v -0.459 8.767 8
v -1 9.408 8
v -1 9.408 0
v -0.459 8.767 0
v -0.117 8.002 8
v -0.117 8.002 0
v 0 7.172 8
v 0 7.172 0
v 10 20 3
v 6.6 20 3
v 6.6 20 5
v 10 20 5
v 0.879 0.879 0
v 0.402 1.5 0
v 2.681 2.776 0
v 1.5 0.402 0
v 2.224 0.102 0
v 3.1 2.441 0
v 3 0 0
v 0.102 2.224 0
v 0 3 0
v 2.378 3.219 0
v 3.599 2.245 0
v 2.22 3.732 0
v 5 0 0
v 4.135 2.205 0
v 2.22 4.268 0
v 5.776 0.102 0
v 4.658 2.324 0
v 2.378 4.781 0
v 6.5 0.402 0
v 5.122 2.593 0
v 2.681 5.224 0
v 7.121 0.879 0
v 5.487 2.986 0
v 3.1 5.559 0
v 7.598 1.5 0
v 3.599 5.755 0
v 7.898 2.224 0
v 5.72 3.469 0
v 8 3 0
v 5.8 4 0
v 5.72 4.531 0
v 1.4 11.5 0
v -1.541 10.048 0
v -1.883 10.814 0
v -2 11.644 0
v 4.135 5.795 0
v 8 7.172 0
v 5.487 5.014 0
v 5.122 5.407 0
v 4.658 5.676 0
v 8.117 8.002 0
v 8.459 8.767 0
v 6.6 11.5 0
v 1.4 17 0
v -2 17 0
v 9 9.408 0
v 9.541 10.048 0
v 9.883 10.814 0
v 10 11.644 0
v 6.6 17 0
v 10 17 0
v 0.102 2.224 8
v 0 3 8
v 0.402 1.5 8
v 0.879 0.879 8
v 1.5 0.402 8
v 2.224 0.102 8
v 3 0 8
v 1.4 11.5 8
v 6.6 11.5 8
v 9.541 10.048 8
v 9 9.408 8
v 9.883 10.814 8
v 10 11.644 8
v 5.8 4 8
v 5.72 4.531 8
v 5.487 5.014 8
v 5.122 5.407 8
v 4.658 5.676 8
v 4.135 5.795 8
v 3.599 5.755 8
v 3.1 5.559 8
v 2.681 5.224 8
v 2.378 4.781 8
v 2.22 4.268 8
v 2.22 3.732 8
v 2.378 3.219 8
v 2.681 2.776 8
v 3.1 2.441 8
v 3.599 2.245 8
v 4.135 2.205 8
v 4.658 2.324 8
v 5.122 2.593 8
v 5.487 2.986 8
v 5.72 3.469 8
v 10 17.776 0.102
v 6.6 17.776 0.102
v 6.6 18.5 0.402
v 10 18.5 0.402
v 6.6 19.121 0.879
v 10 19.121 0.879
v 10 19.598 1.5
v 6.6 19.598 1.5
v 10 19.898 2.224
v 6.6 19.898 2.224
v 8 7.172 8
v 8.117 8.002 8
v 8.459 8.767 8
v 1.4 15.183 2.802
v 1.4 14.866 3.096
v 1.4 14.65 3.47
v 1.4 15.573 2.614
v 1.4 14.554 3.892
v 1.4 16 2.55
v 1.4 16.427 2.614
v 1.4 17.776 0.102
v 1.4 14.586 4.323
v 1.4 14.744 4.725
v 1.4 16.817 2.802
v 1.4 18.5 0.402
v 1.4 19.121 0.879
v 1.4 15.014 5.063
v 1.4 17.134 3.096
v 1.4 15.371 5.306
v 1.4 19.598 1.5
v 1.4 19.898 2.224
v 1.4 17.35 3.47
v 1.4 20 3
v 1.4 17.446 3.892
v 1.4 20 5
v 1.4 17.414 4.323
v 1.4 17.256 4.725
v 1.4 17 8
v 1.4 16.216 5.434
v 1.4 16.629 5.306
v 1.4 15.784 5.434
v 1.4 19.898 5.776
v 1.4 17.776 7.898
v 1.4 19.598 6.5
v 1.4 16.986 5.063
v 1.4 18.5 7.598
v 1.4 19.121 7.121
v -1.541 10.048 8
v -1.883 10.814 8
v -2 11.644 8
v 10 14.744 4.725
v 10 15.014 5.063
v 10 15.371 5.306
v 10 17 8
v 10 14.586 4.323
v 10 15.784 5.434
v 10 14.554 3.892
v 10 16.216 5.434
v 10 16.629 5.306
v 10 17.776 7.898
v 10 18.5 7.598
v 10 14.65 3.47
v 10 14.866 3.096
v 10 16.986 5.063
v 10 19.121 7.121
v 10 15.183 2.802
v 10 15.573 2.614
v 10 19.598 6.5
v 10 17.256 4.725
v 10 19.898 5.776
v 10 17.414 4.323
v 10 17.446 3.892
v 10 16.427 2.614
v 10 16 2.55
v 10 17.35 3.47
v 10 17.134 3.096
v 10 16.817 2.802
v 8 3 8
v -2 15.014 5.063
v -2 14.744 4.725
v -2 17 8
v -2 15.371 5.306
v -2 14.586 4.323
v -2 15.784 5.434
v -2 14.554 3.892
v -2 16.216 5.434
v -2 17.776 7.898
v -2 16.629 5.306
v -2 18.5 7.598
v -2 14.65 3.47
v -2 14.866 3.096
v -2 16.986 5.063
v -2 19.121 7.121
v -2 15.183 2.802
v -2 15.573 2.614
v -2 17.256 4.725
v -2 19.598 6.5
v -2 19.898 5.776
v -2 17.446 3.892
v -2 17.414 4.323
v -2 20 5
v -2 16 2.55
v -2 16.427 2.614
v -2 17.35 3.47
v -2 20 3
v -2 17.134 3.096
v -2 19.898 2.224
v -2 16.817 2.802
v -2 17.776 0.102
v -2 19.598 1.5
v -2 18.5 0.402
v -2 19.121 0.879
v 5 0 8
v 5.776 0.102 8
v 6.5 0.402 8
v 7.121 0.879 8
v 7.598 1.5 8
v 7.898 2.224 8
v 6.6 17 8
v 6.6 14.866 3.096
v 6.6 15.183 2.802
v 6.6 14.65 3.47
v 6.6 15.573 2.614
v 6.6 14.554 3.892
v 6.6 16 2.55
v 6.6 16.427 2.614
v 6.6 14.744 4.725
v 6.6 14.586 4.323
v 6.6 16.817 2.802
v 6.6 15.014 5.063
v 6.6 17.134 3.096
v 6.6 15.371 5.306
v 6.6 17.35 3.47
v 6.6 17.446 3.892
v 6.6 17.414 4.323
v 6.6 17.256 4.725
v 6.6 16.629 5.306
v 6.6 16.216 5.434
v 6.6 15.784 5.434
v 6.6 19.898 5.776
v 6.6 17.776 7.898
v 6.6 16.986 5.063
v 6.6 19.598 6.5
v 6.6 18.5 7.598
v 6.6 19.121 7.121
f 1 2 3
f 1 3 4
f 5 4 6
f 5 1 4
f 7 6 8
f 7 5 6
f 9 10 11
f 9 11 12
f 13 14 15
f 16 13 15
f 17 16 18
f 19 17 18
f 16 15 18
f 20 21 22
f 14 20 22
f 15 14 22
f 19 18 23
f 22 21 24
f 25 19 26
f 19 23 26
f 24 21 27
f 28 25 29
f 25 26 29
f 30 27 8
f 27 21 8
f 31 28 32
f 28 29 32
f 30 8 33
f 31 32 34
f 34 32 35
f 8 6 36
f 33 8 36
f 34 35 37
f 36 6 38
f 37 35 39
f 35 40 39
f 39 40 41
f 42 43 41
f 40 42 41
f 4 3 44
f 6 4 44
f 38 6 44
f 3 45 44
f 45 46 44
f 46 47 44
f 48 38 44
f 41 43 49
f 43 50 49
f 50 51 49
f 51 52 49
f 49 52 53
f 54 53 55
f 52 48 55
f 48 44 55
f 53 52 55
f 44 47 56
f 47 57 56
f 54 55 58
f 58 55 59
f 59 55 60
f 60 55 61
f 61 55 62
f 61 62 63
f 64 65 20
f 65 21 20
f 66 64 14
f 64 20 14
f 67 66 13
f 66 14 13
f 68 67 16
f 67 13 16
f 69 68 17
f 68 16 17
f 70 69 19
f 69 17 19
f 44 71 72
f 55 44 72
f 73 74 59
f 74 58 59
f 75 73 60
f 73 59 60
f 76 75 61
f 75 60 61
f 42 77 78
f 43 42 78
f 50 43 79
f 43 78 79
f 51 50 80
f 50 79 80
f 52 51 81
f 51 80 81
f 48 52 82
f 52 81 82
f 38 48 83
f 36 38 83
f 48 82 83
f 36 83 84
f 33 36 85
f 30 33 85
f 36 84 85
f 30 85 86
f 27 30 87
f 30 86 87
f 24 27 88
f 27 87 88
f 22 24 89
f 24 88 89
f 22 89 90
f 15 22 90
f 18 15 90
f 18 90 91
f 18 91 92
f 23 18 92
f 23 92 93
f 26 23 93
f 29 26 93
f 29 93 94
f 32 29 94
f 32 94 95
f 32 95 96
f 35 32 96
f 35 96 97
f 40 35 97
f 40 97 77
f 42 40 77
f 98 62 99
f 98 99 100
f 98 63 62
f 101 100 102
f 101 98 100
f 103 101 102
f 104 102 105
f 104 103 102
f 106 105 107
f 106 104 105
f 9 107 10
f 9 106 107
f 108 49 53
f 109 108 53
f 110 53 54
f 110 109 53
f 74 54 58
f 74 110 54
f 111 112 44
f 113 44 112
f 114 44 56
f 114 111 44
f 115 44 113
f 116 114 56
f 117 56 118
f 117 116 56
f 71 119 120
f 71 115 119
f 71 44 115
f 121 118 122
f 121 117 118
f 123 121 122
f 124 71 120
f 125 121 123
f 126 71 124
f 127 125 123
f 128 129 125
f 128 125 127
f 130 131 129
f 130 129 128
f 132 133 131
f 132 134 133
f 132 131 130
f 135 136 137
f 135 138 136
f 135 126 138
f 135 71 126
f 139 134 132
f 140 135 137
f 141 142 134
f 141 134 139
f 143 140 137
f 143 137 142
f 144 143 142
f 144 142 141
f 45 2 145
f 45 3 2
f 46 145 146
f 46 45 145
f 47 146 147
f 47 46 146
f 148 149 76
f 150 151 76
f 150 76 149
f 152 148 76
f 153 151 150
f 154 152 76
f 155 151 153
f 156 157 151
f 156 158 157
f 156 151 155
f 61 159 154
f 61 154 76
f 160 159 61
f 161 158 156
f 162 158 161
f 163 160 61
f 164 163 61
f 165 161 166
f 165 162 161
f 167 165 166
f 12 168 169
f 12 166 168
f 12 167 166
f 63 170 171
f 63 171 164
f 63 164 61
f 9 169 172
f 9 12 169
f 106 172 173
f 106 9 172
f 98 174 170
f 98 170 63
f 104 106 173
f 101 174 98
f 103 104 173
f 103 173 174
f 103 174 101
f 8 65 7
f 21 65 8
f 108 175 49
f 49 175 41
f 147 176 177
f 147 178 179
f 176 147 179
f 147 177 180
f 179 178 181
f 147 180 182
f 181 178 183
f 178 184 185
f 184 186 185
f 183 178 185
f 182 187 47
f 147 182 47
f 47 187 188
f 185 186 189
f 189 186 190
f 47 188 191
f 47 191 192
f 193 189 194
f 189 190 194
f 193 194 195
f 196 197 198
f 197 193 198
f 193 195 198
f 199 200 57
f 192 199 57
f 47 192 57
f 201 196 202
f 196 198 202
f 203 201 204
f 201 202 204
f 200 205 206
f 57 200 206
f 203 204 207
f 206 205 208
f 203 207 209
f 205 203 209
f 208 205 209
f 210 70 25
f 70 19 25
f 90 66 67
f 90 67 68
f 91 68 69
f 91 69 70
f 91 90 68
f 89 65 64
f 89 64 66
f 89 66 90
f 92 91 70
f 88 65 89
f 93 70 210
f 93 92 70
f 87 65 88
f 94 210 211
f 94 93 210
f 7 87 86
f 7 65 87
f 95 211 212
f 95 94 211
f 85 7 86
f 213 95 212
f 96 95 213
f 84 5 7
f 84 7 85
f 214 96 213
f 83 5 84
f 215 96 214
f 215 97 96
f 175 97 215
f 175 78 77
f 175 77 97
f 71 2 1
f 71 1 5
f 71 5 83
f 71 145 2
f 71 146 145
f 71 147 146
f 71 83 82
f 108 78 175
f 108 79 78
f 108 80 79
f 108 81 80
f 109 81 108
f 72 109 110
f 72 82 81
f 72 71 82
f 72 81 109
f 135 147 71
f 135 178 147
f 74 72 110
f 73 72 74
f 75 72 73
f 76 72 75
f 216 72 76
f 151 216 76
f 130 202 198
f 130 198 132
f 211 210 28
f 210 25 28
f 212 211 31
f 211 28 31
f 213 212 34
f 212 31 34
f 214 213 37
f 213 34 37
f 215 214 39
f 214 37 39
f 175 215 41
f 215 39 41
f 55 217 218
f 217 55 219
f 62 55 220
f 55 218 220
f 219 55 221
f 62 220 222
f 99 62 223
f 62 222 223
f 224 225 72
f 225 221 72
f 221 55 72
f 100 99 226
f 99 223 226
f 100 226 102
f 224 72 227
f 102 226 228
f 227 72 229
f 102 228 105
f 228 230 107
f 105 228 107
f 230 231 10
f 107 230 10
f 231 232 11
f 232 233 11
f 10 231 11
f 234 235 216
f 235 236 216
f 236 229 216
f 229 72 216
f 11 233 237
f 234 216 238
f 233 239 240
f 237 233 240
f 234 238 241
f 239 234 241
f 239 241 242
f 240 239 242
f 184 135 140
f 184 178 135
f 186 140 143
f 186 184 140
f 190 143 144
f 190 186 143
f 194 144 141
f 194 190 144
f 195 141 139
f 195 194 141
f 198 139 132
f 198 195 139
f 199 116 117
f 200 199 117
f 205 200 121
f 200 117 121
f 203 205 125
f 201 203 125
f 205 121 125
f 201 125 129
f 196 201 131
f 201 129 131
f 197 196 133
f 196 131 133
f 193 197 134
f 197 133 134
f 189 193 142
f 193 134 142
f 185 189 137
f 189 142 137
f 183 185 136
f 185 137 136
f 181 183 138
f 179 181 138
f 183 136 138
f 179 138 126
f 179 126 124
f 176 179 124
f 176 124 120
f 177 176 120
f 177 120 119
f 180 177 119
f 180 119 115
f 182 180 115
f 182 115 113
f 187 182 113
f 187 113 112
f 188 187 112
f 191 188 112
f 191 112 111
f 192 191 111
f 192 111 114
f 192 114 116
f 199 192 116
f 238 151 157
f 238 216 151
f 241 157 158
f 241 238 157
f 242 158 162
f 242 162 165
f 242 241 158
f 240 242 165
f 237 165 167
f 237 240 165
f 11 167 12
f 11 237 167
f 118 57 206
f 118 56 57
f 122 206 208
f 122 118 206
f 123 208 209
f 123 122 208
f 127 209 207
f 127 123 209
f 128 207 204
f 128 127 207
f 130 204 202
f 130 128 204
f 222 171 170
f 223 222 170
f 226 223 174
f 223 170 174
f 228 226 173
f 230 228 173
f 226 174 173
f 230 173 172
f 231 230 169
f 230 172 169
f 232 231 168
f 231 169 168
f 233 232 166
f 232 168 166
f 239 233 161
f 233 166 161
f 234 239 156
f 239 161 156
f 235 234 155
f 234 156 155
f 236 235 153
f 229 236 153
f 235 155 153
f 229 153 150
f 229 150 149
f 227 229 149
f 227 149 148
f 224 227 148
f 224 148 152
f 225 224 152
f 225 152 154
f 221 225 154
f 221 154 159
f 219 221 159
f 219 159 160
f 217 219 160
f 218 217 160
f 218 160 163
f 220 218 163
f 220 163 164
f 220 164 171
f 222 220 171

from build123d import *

# Parameters (mm, degrees)
SKETCH_1_W          = 8
SKETCH_1_H          = 8
EXTRUDE_1_DEPTH     = 20
SKETCH_2_R          = 1.8
CUT_EXTRUDE_1_DEPTH = 23.978250586
SKETCH_4_W          = 2
SKETCH_4_H          = 8
EXTRUDE_3_DEPTH     = 10
SKETCH_5_W          = 5.2
SKETCH_5_H          = 8.5
CUT_EXTRUDE_2_DEPTH = 24.748684174
FILLET_1_R          = 3
SKETCH_6_R          = 1.45
CUT_EXTRUDE_3_DEPTH = 25.657656012
FILLET_2_R          = 3


with BuildPart() as part:
    # 草图1 → 凸台-拉伸1 (new body)
    with BuildSketch(Plane(origin=(0, 0, 0), x_dir=(1, 0, 0), z_dir=(0, 1, 0))):
        with Locations((4, -4)):
            Rectangle(SKETCH_1_W, SKETCH_1_H)
    extrude(amount=EXTRUDE_1_DEPTH)

    # 草图2 → 切除-拉伸1 (cut, through all)
    with BuildSketch(Plane.XY.offset(8)):
        with Locations((4, 4)):
            Circle(SKETCH_2_R)
    extrude(amount=-CUT_EXTRUDE_1_DEPTH, mode=Mode.SUBTRACT)

    # 草图4 → 凸台-拉伸3 (add)
    with BuildSketch(Plane(origin=(0, 20, 0), x_dir=(1, 0, 0), z_dir=(0, 1, 0))):
        with Locations((-1, -4)):
            Rectangle(SKETCH_4_W, SKETCH_4_H)
        with Locations((9, -4)):
            Rectangle(SKETCH_4_W, SKETCH_4_H)
    extrude(amount=-EXTRUDE_3_DEPTH)

    # 草图5 → 切除-拉伸2 (cut, through all)
    with BuildSketch(Plane.XY.offset(8)):
        with Locations((4, 15.75)):
            Rectangle(SKETCH_5_W, SKETCH_5_H)
    extrude(amount=-CUT_EXTRUDE_2_DEPTH, mode=Mode.SUBTRACT)

    # 圆角1
    # the kernel refuses this fillet: 3 mm, written as the material it adds along each edge
    with BuildSketch(Plane(origin=(8, 10, 8), x_dir=(0, -1, 0), z_dir=(0, 0, -1))) as fillet_1_piece_1:
        with BuildLine():
            CenterArc((2.828427125, -3), FILLET_1_R, 90, 70.528779366)
            Line((0, -2), (-0.056568542, -1.98))
            ThreePointArc((-0.056568542, -1.98), (-0.06, -1), (-0.06, 0))
            Line((-0.06, 0), (0, 0.06))
            Line((0, 0.06), (2.828427125, 0.06))
            Line((2.828427125, 0.06), (2.828427125, 0))
        make_face()
    extrude(amount=8)
    with BuildSketch(Plane(origin=(0, 10, 8), x_dir=(-1, 0, 0), z_dir=(0, 0, -1))) as fillet_1_piece_2:
        with BuildLine():
            CenterArc((3, -2.828427125), FILLET_1_R, 109.471220634, 70.528779366)
            Line((0, -2.828427125), (-0.06, -2.828427125))
            Line((-0.06, -2.828427125), (-0.06, 0))
            Line((-0.06, 0), (0, 0.06))
            ThreePointArc((0, 0.06), (1, 0.06), (1.98, 0.056568542))
            Line((1.98, 0.056568542), (2, 0))
        make_face()
    extrude(amount=8)

    # 草图6 → 切除-拉伸3 (cut, through all)
    with BuildSketch(Plane(origin=(10, 0, 0), x_dir=(0, 0, -1), z_dir=(1, 0, 0))):
        with Locations((-4, 16)):
            Circle(SKETCH_6_R)
    extrude(amount=-CUT_EXTRUDE_3_DEPTH, mode=Mode.SUBTRACT)

    # 圆角2
    fillet_2_edges = [part.edges().sort_by_distance(p)[0] for p in [
        (8.3, 20, 0),
        (-2, 10, 4),
        (10, 10, 4),
        (-0.3, 20, 0),
        (8.3, 20, 8),
        (8, 0, 4),
        (0, 0, 4),
        (-0.3, 20, 8),
    ]]
    fillet(fillet_2_edges, radius=FILLET_2_R)


solid = part.part
